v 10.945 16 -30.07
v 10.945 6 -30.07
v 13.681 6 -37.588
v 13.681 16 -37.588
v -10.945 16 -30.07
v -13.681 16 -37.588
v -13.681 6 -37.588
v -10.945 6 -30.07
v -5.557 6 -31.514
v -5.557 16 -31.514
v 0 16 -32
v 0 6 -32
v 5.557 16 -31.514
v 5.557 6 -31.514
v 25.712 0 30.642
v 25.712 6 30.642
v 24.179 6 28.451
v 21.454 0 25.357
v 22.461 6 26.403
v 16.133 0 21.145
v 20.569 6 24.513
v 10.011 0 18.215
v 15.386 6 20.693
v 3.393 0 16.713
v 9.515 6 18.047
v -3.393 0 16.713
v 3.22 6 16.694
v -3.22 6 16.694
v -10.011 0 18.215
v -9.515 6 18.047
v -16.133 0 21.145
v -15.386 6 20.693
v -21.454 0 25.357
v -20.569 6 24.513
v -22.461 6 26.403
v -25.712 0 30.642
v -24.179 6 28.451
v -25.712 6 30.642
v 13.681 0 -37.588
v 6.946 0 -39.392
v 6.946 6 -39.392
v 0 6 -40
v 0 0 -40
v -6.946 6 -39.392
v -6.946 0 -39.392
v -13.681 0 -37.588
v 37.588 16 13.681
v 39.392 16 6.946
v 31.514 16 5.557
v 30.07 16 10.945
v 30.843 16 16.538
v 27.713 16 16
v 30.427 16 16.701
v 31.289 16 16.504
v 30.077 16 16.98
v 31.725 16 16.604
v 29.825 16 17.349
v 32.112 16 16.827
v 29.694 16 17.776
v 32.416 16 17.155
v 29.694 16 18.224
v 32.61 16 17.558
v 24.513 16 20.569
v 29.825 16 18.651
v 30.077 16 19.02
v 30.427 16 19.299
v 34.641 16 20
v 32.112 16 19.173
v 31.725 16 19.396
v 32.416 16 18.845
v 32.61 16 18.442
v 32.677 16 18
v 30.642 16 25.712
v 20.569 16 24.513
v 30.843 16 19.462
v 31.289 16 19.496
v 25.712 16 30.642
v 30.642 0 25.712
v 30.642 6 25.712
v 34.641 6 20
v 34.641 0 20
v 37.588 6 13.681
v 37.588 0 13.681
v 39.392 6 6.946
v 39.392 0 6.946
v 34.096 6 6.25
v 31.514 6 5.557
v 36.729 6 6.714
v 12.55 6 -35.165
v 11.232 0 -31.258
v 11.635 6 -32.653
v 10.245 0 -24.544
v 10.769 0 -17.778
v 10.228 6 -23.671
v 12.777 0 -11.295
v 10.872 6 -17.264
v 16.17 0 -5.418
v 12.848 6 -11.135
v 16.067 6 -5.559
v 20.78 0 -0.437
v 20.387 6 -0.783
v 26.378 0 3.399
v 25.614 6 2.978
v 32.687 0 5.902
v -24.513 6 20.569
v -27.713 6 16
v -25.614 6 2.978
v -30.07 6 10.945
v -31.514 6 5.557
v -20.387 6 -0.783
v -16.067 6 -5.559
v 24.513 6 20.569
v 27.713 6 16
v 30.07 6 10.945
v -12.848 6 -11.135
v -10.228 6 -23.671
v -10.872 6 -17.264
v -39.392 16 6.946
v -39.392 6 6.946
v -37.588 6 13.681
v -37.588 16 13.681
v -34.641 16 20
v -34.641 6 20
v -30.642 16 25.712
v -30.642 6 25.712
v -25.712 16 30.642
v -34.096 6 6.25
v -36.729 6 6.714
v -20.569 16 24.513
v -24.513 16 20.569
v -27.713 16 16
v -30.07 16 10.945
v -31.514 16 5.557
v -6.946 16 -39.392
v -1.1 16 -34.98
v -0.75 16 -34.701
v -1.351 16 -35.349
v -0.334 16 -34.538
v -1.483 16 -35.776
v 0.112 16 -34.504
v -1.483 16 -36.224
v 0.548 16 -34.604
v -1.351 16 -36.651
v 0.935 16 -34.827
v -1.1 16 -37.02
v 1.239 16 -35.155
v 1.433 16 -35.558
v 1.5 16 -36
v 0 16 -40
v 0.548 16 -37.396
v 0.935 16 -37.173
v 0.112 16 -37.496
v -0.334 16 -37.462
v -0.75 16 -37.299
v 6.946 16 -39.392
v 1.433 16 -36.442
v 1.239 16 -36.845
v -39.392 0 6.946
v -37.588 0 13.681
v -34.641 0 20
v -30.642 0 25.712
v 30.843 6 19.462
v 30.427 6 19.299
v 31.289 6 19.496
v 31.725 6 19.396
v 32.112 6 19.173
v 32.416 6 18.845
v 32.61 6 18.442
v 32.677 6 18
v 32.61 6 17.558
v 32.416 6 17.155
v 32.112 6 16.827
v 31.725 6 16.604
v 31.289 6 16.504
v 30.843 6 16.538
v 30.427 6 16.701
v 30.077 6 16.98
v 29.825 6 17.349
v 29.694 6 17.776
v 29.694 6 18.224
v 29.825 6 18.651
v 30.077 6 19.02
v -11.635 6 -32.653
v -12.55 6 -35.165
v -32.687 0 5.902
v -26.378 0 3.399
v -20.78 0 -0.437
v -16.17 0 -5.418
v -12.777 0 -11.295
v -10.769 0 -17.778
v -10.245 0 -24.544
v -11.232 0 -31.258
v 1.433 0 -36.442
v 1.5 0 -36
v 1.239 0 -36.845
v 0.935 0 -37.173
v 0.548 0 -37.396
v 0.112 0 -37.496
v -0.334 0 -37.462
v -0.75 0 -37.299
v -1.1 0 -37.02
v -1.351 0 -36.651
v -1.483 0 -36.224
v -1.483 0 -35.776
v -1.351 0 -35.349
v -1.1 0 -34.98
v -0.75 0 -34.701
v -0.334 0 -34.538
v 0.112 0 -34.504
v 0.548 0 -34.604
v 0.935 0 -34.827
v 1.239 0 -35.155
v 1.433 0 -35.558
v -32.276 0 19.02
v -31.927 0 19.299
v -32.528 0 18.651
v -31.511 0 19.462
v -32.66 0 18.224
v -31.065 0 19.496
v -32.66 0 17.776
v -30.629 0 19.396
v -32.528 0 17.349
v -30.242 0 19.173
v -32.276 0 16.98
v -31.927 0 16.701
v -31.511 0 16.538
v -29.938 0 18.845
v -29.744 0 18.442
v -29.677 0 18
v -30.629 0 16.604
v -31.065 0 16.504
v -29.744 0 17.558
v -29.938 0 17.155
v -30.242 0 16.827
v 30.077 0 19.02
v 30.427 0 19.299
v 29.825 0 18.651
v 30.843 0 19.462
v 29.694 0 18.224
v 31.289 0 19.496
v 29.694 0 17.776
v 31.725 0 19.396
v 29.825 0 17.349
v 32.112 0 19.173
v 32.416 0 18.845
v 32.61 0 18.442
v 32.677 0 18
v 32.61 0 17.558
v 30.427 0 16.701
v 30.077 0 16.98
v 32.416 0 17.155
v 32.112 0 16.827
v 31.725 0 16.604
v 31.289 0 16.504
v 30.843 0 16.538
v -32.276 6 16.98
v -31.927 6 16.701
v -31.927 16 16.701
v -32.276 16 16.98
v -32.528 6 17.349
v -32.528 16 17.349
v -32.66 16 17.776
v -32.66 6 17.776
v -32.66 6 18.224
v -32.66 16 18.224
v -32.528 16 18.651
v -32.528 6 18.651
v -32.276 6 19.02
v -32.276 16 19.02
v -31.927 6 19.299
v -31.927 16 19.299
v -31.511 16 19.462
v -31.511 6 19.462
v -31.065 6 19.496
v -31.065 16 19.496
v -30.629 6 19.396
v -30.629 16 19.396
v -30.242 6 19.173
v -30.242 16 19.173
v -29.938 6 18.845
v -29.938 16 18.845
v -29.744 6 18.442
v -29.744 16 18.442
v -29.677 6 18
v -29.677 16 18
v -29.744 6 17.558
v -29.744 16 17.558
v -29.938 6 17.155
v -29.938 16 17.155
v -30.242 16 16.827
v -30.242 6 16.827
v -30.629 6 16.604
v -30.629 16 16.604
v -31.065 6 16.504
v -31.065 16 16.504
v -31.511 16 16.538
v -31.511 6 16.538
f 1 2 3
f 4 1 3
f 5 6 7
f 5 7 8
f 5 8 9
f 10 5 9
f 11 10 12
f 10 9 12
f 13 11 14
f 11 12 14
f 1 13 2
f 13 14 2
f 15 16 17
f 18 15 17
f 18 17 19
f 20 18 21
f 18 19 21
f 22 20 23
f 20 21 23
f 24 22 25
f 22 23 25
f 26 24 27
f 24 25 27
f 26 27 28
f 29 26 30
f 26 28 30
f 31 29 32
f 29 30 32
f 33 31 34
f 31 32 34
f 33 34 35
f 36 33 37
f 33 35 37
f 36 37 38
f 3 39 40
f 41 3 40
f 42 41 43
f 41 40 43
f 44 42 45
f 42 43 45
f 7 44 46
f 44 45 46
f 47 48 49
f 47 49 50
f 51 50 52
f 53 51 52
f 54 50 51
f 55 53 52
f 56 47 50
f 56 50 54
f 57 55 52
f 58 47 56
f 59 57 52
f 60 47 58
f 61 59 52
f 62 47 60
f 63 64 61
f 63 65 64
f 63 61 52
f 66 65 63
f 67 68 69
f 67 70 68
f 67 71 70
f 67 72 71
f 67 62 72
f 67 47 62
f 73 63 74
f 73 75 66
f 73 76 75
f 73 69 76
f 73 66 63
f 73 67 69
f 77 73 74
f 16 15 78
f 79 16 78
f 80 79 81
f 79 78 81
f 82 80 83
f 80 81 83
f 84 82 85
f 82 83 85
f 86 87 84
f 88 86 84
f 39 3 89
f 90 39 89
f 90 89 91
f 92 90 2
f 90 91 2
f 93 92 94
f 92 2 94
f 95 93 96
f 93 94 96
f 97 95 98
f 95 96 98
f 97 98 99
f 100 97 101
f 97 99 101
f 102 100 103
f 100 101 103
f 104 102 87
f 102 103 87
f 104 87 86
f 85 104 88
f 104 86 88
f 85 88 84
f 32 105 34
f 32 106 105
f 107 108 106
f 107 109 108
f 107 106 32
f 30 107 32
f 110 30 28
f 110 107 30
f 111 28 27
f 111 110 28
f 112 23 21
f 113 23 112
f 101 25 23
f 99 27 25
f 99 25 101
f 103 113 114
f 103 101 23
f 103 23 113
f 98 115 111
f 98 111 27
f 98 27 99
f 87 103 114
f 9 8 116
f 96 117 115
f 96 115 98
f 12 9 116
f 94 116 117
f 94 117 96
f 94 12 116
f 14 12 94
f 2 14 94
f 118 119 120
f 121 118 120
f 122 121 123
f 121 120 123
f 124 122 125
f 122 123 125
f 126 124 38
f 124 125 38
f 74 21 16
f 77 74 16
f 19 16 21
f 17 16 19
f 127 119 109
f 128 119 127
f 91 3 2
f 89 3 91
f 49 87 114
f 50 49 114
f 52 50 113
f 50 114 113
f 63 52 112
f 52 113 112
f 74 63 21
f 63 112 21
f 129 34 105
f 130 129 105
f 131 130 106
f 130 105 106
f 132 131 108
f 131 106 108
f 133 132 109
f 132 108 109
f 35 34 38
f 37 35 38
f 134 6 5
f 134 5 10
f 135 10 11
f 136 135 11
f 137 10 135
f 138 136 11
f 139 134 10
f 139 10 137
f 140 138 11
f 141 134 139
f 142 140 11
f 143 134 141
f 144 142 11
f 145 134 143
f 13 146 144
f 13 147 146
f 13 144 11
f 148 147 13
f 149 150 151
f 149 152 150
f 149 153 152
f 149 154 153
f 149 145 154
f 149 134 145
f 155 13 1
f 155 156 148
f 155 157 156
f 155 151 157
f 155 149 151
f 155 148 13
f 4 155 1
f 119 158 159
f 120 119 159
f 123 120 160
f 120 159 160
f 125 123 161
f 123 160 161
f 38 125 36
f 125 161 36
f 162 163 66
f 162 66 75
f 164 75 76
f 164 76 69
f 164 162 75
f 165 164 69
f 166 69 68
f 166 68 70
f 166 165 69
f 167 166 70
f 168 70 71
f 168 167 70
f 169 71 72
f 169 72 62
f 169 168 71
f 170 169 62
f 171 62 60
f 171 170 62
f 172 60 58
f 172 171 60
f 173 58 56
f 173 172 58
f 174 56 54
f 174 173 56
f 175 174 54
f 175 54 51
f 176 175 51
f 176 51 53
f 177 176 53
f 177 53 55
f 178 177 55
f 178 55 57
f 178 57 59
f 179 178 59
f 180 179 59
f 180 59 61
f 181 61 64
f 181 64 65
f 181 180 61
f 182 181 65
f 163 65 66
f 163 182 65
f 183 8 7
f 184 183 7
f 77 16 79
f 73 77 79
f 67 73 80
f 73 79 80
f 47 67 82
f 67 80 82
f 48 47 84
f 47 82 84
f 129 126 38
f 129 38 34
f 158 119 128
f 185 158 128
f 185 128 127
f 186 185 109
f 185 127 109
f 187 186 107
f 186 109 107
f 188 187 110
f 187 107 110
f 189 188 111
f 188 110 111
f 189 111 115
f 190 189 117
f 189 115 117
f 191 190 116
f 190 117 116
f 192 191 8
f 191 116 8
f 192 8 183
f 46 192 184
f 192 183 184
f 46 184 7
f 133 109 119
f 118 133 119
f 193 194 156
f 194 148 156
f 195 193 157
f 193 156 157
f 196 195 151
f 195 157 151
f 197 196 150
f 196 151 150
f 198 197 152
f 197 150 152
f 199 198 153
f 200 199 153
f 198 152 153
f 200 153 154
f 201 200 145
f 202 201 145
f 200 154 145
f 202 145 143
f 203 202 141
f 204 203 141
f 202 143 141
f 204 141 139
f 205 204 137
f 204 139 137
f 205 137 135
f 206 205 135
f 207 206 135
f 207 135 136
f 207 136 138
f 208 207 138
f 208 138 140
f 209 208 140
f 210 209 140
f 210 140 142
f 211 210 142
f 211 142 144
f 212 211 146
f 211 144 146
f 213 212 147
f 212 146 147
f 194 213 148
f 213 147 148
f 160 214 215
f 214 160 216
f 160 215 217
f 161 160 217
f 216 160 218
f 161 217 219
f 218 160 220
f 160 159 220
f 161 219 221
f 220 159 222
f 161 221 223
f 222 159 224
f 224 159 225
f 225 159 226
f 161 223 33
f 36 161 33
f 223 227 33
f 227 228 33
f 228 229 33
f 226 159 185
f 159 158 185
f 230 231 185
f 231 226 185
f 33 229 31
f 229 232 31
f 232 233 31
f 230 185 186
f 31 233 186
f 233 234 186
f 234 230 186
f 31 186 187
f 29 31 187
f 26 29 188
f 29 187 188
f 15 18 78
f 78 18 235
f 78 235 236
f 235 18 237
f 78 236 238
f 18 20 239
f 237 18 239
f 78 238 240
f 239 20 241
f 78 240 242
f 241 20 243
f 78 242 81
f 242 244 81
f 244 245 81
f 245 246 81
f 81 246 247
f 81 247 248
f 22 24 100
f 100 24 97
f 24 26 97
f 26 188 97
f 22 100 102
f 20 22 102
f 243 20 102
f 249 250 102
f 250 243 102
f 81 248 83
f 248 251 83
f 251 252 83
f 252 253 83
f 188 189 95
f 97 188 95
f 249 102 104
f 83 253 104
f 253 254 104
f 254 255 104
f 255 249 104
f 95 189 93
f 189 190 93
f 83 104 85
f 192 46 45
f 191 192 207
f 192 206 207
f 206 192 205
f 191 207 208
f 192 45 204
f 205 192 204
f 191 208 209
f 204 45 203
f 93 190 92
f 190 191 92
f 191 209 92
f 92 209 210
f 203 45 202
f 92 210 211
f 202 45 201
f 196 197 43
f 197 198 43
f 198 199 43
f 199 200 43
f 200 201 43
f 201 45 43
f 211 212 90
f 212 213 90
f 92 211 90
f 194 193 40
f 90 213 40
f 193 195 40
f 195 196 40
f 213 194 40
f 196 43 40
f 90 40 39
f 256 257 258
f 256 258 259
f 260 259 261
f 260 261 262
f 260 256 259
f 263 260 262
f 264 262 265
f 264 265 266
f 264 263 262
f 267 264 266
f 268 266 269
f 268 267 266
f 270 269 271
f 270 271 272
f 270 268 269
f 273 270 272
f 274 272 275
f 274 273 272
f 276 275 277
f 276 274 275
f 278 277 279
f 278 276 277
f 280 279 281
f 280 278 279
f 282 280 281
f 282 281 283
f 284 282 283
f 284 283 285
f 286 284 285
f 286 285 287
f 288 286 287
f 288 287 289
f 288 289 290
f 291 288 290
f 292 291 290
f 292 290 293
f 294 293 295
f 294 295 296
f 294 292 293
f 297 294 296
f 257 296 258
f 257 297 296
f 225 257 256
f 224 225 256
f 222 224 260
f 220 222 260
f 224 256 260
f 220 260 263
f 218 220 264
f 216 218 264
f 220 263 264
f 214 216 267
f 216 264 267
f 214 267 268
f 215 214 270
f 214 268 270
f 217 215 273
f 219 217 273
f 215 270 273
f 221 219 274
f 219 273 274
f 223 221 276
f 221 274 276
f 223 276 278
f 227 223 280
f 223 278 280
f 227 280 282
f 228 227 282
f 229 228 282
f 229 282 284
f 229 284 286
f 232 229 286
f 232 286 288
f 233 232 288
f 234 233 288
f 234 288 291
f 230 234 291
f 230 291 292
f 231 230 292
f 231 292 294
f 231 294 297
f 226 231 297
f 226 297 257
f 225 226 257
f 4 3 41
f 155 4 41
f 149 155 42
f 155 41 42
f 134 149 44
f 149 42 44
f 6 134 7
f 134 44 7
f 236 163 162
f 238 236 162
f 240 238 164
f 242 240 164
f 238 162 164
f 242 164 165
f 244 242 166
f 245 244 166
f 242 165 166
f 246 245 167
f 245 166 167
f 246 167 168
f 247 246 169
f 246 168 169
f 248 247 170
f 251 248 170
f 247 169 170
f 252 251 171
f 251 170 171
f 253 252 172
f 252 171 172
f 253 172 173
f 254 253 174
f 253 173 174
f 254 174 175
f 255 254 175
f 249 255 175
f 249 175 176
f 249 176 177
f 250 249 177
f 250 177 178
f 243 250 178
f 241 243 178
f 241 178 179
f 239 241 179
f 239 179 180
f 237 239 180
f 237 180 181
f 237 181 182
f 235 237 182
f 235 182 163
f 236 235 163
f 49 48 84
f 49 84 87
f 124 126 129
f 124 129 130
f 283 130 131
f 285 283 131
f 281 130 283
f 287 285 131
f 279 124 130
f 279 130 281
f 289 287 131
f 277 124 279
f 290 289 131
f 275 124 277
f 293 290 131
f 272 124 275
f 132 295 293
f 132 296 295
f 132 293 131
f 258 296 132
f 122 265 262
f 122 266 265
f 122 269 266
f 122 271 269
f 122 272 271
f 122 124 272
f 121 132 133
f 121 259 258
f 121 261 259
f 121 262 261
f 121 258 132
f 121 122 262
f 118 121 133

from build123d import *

# Parameters (mm, degrees)
SKETCH1_R           = 40
BOSS_EXTRUDE1_DEPTH = 6
SKETCH2_R           = 1.5
BOSS_EXTRUDE2_DEPTH = 10
SKETCH16_R          = 1.5
CUT_EXTRUDE9_DEPTH  = 17
CIRPATTERN1_COUNT   = 3
SKETCH5_R           = 30.471270003
CUT_EXTRUDE3_DEPTH  = 7
CIRPATTERN2_COUNT   = 3


with BuildPart() as part:
    # Sketch1 → Boss-Extrude1 (new body)
    with BuildSketch(Plane(origin=(0, 0, 0), x_dir=(1, 0, 0), z_dir=(0, 1, 0))):
        Circle(SKETCH1_R)
    extrude(amount=BOSS_EXTRUDE1_DEPTH)

    # Sketch2 → Boss-Extrude2 (add)
    with BuildSketch(Plane(origin=(0, 6, 0), x_dir=(1, 0, 0), z_dir=(0, 1, 0))):
        with BuildLine():
            Line((-13.680805733, 37.587704831), (-10.944644586, 30.070163865))
            ThreePointArc((-10.944644586, 30.070163865), (0, 32), (10.944644586, 30.070163865))
            Line((10.944644586, 30.070163865), (13.680805733, 37.587704831))
            ThreePointArc((13.680805733, 37.587704831), (0, 40), (-13.680805733, 37.587704831))
        make_face()
        with Locations((0, 36)):
            Circle(SKETCH2_R, mode=Mode.SUBTRACT)
    boss_extrude2 = extrude(amount=BOSS_EXTRUDE2_DEPTH)

    # Sketch16 → Cut-Extrude9 (cut, through all)
    with BuildSketch(Plane(origin=(0, 16, 0), x_dir=(1, 0, 0), z_dir=(0, 1, 0))):
        with Locations((0, 36)):
            Circle(SKETCH16_R)
    cut_extrude9 = extrude(amount=-CUT_EXTRUDE9_DEPTH, mode=Mode.SUBTRACT)

    # CirPattern1: Boss-Extrude2, Cut-Extrude9 ×3 about axis
    cirpattern1_axis = Axis((0, 0, 0), (0, 1, 0))
    for i in range(1, CIRPATTERN1_COUNT):
        add(boss_extrude2.rotate(cirpattern1_axis, i * 360 / CIRPATTERN1_COUNT))
        add(cut_extrude9.rotate(cirpattern1_axis, i * 360 / CIRPATTERN1_COUNT), mode=Mode.SUBTRACT)

    # Sketch5 → Cut-Extrude3 (cut, through all)
    with BuildSketch(Plane(origin=(0, 6, 0), x_dir=(1, 0, 0), z_dir=(0, 1, 0))):
        with Locations((40.698571494, 23.497331208)):
            Circle(SKETCH5_R)
    cut_extrude3 = extrude(amount=-CUT_EXTRUDE3_DEPTH, mode=Mode.SUBTRACT)

    # CirPattern2: Cut-Extrude3 ×3 about axis
    cirpattern2_axis = Axis((0, 0, 0), (0, 1, 0))
    for i in range(1, CIRPATTERN2_COUNT):
        add(cut_extrude3.rotate(cirpattern2_axis, i * 360 / CIRPATTERN2_COUNT), mode=Mode.SUBTRACT)


solid = part.part
